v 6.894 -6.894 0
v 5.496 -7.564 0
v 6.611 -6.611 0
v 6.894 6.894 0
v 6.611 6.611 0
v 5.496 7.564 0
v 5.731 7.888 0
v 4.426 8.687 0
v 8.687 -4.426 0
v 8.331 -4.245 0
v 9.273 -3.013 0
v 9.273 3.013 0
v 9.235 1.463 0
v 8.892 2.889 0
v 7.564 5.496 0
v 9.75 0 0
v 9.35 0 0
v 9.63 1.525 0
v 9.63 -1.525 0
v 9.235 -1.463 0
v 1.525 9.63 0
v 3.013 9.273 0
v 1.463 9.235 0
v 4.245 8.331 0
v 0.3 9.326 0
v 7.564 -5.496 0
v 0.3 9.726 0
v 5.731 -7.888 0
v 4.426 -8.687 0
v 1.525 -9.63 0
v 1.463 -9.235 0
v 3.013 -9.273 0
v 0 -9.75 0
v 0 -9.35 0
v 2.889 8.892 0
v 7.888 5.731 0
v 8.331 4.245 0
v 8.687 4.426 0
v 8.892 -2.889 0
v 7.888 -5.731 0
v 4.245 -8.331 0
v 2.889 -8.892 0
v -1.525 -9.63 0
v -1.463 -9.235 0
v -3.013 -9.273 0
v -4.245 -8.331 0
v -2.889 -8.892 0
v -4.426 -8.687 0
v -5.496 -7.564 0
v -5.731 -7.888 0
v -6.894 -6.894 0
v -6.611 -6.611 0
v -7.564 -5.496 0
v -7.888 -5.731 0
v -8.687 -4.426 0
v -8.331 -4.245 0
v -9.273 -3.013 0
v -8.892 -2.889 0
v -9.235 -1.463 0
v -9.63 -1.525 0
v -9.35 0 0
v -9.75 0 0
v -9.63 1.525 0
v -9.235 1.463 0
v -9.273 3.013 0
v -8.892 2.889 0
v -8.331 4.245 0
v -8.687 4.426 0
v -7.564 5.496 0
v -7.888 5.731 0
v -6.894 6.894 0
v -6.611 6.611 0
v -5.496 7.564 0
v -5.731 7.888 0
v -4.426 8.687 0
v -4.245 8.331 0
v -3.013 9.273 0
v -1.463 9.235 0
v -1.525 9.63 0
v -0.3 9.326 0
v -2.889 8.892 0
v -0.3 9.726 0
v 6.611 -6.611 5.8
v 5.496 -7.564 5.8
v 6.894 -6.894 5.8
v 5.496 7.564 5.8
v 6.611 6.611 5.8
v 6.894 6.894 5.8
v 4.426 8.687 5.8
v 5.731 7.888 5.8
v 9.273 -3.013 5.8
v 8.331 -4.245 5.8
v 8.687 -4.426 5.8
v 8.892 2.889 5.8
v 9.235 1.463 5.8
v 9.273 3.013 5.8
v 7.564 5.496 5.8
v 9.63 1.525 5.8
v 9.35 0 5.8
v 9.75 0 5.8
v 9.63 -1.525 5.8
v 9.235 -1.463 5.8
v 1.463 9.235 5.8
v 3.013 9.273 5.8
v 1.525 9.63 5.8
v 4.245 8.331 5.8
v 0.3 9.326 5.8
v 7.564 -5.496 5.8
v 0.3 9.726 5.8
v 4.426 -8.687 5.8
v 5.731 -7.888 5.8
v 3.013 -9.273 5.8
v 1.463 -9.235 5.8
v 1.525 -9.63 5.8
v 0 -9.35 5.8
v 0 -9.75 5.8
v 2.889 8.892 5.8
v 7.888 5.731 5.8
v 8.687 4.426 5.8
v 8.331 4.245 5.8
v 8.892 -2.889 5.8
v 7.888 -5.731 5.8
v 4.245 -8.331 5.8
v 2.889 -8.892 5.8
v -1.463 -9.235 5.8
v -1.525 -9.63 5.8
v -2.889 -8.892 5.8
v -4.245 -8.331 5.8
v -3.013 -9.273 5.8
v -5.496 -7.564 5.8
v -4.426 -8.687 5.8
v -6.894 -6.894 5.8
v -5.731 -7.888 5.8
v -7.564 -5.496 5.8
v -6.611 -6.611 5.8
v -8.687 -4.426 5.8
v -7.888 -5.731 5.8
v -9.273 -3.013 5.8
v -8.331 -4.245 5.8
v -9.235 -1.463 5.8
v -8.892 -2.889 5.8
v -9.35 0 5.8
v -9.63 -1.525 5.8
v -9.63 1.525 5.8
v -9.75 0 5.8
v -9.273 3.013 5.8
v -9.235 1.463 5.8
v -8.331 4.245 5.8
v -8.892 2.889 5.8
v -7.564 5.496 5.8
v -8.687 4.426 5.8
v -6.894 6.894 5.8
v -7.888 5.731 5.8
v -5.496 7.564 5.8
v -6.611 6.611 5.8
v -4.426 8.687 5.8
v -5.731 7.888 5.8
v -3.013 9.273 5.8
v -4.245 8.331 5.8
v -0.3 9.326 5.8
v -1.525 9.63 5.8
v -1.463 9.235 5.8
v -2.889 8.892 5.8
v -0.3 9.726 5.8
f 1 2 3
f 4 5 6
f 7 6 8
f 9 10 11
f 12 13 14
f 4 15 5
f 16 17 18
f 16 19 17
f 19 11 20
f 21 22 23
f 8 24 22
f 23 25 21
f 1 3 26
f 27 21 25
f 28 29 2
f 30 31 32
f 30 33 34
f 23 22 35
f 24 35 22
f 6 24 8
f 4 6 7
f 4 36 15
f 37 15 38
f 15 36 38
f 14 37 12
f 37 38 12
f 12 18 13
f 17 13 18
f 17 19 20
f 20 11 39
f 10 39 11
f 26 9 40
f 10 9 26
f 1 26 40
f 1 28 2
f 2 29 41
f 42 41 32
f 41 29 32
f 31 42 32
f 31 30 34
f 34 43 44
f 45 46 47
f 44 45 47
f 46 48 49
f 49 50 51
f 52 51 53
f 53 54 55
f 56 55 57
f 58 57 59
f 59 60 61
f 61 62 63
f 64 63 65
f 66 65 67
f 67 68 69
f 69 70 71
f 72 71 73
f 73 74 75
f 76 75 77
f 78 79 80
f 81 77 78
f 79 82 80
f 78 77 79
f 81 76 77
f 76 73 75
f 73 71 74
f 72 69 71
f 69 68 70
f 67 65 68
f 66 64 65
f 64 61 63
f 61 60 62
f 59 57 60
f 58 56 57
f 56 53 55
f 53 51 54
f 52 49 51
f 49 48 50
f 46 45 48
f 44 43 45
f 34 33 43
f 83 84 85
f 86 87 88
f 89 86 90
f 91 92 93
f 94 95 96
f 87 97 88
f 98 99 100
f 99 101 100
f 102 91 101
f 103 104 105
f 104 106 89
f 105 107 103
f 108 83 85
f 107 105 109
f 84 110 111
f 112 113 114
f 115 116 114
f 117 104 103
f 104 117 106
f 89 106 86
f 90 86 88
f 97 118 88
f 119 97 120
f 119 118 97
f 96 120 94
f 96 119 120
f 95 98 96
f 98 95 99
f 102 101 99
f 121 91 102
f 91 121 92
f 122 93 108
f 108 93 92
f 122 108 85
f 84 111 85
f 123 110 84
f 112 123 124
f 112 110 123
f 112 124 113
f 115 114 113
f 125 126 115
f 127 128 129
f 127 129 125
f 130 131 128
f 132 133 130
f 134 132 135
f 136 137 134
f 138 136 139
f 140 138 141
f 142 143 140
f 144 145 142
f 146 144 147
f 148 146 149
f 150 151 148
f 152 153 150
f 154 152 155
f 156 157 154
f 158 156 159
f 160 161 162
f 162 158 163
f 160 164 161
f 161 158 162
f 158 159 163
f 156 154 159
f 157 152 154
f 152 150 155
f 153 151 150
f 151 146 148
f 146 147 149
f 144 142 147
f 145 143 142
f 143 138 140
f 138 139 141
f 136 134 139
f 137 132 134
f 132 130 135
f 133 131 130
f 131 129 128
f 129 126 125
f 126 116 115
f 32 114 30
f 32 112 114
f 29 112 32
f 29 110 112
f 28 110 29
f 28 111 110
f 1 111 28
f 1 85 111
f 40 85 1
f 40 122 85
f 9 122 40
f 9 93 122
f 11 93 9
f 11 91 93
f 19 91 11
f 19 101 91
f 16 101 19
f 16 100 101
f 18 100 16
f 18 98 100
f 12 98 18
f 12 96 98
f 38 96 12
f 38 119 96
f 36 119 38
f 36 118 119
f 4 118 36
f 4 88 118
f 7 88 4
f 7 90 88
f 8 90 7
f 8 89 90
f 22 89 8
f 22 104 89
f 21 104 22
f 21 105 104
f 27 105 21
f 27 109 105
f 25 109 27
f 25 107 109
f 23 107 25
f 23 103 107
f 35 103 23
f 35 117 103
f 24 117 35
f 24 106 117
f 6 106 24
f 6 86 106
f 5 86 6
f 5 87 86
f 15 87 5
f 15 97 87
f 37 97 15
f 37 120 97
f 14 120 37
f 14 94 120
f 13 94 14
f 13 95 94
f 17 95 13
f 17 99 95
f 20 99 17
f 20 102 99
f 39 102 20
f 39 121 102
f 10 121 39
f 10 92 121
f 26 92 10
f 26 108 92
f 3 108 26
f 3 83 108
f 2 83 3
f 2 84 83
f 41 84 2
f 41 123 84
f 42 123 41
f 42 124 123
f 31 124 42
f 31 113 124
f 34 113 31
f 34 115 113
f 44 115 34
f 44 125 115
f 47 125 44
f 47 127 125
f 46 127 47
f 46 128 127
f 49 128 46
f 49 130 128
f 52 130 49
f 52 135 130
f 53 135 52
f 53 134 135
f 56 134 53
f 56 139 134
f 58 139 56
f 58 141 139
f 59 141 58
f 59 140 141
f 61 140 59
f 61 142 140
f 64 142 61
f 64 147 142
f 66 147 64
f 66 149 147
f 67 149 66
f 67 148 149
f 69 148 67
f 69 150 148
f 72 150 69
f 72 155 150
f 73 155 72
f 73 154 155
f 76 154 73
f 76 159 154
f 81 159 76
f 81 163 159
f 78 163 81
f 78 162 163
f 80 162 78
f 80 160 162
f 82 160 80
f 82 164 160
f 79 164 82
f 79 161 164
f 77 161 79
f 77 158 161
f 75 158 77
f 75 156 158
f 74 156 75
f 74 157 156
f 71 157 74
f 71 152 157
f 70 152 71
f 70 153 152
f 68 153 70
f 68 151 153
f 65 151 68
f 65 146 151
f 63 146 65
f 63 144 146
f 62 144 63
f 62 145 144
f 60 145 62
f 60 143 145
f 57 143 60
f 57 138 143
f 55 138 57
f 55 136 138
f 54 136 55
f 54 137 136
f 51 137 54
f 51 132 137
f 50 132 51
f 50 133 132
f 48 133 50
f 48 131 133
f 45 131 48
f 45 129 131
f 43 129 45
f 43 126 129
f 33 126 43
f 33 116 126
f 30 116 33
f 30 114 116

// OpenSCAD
od = 19.5;
gap = 0.6;
gauge = 0.4;
h = 5.8;
$fn = 40;

linear_extrude(h)
difference() {
  circle(d=od);
  circle(d=od-2*gauge);
  
  translate([-gap/2, 0])
  square([gap, 10]);
}
